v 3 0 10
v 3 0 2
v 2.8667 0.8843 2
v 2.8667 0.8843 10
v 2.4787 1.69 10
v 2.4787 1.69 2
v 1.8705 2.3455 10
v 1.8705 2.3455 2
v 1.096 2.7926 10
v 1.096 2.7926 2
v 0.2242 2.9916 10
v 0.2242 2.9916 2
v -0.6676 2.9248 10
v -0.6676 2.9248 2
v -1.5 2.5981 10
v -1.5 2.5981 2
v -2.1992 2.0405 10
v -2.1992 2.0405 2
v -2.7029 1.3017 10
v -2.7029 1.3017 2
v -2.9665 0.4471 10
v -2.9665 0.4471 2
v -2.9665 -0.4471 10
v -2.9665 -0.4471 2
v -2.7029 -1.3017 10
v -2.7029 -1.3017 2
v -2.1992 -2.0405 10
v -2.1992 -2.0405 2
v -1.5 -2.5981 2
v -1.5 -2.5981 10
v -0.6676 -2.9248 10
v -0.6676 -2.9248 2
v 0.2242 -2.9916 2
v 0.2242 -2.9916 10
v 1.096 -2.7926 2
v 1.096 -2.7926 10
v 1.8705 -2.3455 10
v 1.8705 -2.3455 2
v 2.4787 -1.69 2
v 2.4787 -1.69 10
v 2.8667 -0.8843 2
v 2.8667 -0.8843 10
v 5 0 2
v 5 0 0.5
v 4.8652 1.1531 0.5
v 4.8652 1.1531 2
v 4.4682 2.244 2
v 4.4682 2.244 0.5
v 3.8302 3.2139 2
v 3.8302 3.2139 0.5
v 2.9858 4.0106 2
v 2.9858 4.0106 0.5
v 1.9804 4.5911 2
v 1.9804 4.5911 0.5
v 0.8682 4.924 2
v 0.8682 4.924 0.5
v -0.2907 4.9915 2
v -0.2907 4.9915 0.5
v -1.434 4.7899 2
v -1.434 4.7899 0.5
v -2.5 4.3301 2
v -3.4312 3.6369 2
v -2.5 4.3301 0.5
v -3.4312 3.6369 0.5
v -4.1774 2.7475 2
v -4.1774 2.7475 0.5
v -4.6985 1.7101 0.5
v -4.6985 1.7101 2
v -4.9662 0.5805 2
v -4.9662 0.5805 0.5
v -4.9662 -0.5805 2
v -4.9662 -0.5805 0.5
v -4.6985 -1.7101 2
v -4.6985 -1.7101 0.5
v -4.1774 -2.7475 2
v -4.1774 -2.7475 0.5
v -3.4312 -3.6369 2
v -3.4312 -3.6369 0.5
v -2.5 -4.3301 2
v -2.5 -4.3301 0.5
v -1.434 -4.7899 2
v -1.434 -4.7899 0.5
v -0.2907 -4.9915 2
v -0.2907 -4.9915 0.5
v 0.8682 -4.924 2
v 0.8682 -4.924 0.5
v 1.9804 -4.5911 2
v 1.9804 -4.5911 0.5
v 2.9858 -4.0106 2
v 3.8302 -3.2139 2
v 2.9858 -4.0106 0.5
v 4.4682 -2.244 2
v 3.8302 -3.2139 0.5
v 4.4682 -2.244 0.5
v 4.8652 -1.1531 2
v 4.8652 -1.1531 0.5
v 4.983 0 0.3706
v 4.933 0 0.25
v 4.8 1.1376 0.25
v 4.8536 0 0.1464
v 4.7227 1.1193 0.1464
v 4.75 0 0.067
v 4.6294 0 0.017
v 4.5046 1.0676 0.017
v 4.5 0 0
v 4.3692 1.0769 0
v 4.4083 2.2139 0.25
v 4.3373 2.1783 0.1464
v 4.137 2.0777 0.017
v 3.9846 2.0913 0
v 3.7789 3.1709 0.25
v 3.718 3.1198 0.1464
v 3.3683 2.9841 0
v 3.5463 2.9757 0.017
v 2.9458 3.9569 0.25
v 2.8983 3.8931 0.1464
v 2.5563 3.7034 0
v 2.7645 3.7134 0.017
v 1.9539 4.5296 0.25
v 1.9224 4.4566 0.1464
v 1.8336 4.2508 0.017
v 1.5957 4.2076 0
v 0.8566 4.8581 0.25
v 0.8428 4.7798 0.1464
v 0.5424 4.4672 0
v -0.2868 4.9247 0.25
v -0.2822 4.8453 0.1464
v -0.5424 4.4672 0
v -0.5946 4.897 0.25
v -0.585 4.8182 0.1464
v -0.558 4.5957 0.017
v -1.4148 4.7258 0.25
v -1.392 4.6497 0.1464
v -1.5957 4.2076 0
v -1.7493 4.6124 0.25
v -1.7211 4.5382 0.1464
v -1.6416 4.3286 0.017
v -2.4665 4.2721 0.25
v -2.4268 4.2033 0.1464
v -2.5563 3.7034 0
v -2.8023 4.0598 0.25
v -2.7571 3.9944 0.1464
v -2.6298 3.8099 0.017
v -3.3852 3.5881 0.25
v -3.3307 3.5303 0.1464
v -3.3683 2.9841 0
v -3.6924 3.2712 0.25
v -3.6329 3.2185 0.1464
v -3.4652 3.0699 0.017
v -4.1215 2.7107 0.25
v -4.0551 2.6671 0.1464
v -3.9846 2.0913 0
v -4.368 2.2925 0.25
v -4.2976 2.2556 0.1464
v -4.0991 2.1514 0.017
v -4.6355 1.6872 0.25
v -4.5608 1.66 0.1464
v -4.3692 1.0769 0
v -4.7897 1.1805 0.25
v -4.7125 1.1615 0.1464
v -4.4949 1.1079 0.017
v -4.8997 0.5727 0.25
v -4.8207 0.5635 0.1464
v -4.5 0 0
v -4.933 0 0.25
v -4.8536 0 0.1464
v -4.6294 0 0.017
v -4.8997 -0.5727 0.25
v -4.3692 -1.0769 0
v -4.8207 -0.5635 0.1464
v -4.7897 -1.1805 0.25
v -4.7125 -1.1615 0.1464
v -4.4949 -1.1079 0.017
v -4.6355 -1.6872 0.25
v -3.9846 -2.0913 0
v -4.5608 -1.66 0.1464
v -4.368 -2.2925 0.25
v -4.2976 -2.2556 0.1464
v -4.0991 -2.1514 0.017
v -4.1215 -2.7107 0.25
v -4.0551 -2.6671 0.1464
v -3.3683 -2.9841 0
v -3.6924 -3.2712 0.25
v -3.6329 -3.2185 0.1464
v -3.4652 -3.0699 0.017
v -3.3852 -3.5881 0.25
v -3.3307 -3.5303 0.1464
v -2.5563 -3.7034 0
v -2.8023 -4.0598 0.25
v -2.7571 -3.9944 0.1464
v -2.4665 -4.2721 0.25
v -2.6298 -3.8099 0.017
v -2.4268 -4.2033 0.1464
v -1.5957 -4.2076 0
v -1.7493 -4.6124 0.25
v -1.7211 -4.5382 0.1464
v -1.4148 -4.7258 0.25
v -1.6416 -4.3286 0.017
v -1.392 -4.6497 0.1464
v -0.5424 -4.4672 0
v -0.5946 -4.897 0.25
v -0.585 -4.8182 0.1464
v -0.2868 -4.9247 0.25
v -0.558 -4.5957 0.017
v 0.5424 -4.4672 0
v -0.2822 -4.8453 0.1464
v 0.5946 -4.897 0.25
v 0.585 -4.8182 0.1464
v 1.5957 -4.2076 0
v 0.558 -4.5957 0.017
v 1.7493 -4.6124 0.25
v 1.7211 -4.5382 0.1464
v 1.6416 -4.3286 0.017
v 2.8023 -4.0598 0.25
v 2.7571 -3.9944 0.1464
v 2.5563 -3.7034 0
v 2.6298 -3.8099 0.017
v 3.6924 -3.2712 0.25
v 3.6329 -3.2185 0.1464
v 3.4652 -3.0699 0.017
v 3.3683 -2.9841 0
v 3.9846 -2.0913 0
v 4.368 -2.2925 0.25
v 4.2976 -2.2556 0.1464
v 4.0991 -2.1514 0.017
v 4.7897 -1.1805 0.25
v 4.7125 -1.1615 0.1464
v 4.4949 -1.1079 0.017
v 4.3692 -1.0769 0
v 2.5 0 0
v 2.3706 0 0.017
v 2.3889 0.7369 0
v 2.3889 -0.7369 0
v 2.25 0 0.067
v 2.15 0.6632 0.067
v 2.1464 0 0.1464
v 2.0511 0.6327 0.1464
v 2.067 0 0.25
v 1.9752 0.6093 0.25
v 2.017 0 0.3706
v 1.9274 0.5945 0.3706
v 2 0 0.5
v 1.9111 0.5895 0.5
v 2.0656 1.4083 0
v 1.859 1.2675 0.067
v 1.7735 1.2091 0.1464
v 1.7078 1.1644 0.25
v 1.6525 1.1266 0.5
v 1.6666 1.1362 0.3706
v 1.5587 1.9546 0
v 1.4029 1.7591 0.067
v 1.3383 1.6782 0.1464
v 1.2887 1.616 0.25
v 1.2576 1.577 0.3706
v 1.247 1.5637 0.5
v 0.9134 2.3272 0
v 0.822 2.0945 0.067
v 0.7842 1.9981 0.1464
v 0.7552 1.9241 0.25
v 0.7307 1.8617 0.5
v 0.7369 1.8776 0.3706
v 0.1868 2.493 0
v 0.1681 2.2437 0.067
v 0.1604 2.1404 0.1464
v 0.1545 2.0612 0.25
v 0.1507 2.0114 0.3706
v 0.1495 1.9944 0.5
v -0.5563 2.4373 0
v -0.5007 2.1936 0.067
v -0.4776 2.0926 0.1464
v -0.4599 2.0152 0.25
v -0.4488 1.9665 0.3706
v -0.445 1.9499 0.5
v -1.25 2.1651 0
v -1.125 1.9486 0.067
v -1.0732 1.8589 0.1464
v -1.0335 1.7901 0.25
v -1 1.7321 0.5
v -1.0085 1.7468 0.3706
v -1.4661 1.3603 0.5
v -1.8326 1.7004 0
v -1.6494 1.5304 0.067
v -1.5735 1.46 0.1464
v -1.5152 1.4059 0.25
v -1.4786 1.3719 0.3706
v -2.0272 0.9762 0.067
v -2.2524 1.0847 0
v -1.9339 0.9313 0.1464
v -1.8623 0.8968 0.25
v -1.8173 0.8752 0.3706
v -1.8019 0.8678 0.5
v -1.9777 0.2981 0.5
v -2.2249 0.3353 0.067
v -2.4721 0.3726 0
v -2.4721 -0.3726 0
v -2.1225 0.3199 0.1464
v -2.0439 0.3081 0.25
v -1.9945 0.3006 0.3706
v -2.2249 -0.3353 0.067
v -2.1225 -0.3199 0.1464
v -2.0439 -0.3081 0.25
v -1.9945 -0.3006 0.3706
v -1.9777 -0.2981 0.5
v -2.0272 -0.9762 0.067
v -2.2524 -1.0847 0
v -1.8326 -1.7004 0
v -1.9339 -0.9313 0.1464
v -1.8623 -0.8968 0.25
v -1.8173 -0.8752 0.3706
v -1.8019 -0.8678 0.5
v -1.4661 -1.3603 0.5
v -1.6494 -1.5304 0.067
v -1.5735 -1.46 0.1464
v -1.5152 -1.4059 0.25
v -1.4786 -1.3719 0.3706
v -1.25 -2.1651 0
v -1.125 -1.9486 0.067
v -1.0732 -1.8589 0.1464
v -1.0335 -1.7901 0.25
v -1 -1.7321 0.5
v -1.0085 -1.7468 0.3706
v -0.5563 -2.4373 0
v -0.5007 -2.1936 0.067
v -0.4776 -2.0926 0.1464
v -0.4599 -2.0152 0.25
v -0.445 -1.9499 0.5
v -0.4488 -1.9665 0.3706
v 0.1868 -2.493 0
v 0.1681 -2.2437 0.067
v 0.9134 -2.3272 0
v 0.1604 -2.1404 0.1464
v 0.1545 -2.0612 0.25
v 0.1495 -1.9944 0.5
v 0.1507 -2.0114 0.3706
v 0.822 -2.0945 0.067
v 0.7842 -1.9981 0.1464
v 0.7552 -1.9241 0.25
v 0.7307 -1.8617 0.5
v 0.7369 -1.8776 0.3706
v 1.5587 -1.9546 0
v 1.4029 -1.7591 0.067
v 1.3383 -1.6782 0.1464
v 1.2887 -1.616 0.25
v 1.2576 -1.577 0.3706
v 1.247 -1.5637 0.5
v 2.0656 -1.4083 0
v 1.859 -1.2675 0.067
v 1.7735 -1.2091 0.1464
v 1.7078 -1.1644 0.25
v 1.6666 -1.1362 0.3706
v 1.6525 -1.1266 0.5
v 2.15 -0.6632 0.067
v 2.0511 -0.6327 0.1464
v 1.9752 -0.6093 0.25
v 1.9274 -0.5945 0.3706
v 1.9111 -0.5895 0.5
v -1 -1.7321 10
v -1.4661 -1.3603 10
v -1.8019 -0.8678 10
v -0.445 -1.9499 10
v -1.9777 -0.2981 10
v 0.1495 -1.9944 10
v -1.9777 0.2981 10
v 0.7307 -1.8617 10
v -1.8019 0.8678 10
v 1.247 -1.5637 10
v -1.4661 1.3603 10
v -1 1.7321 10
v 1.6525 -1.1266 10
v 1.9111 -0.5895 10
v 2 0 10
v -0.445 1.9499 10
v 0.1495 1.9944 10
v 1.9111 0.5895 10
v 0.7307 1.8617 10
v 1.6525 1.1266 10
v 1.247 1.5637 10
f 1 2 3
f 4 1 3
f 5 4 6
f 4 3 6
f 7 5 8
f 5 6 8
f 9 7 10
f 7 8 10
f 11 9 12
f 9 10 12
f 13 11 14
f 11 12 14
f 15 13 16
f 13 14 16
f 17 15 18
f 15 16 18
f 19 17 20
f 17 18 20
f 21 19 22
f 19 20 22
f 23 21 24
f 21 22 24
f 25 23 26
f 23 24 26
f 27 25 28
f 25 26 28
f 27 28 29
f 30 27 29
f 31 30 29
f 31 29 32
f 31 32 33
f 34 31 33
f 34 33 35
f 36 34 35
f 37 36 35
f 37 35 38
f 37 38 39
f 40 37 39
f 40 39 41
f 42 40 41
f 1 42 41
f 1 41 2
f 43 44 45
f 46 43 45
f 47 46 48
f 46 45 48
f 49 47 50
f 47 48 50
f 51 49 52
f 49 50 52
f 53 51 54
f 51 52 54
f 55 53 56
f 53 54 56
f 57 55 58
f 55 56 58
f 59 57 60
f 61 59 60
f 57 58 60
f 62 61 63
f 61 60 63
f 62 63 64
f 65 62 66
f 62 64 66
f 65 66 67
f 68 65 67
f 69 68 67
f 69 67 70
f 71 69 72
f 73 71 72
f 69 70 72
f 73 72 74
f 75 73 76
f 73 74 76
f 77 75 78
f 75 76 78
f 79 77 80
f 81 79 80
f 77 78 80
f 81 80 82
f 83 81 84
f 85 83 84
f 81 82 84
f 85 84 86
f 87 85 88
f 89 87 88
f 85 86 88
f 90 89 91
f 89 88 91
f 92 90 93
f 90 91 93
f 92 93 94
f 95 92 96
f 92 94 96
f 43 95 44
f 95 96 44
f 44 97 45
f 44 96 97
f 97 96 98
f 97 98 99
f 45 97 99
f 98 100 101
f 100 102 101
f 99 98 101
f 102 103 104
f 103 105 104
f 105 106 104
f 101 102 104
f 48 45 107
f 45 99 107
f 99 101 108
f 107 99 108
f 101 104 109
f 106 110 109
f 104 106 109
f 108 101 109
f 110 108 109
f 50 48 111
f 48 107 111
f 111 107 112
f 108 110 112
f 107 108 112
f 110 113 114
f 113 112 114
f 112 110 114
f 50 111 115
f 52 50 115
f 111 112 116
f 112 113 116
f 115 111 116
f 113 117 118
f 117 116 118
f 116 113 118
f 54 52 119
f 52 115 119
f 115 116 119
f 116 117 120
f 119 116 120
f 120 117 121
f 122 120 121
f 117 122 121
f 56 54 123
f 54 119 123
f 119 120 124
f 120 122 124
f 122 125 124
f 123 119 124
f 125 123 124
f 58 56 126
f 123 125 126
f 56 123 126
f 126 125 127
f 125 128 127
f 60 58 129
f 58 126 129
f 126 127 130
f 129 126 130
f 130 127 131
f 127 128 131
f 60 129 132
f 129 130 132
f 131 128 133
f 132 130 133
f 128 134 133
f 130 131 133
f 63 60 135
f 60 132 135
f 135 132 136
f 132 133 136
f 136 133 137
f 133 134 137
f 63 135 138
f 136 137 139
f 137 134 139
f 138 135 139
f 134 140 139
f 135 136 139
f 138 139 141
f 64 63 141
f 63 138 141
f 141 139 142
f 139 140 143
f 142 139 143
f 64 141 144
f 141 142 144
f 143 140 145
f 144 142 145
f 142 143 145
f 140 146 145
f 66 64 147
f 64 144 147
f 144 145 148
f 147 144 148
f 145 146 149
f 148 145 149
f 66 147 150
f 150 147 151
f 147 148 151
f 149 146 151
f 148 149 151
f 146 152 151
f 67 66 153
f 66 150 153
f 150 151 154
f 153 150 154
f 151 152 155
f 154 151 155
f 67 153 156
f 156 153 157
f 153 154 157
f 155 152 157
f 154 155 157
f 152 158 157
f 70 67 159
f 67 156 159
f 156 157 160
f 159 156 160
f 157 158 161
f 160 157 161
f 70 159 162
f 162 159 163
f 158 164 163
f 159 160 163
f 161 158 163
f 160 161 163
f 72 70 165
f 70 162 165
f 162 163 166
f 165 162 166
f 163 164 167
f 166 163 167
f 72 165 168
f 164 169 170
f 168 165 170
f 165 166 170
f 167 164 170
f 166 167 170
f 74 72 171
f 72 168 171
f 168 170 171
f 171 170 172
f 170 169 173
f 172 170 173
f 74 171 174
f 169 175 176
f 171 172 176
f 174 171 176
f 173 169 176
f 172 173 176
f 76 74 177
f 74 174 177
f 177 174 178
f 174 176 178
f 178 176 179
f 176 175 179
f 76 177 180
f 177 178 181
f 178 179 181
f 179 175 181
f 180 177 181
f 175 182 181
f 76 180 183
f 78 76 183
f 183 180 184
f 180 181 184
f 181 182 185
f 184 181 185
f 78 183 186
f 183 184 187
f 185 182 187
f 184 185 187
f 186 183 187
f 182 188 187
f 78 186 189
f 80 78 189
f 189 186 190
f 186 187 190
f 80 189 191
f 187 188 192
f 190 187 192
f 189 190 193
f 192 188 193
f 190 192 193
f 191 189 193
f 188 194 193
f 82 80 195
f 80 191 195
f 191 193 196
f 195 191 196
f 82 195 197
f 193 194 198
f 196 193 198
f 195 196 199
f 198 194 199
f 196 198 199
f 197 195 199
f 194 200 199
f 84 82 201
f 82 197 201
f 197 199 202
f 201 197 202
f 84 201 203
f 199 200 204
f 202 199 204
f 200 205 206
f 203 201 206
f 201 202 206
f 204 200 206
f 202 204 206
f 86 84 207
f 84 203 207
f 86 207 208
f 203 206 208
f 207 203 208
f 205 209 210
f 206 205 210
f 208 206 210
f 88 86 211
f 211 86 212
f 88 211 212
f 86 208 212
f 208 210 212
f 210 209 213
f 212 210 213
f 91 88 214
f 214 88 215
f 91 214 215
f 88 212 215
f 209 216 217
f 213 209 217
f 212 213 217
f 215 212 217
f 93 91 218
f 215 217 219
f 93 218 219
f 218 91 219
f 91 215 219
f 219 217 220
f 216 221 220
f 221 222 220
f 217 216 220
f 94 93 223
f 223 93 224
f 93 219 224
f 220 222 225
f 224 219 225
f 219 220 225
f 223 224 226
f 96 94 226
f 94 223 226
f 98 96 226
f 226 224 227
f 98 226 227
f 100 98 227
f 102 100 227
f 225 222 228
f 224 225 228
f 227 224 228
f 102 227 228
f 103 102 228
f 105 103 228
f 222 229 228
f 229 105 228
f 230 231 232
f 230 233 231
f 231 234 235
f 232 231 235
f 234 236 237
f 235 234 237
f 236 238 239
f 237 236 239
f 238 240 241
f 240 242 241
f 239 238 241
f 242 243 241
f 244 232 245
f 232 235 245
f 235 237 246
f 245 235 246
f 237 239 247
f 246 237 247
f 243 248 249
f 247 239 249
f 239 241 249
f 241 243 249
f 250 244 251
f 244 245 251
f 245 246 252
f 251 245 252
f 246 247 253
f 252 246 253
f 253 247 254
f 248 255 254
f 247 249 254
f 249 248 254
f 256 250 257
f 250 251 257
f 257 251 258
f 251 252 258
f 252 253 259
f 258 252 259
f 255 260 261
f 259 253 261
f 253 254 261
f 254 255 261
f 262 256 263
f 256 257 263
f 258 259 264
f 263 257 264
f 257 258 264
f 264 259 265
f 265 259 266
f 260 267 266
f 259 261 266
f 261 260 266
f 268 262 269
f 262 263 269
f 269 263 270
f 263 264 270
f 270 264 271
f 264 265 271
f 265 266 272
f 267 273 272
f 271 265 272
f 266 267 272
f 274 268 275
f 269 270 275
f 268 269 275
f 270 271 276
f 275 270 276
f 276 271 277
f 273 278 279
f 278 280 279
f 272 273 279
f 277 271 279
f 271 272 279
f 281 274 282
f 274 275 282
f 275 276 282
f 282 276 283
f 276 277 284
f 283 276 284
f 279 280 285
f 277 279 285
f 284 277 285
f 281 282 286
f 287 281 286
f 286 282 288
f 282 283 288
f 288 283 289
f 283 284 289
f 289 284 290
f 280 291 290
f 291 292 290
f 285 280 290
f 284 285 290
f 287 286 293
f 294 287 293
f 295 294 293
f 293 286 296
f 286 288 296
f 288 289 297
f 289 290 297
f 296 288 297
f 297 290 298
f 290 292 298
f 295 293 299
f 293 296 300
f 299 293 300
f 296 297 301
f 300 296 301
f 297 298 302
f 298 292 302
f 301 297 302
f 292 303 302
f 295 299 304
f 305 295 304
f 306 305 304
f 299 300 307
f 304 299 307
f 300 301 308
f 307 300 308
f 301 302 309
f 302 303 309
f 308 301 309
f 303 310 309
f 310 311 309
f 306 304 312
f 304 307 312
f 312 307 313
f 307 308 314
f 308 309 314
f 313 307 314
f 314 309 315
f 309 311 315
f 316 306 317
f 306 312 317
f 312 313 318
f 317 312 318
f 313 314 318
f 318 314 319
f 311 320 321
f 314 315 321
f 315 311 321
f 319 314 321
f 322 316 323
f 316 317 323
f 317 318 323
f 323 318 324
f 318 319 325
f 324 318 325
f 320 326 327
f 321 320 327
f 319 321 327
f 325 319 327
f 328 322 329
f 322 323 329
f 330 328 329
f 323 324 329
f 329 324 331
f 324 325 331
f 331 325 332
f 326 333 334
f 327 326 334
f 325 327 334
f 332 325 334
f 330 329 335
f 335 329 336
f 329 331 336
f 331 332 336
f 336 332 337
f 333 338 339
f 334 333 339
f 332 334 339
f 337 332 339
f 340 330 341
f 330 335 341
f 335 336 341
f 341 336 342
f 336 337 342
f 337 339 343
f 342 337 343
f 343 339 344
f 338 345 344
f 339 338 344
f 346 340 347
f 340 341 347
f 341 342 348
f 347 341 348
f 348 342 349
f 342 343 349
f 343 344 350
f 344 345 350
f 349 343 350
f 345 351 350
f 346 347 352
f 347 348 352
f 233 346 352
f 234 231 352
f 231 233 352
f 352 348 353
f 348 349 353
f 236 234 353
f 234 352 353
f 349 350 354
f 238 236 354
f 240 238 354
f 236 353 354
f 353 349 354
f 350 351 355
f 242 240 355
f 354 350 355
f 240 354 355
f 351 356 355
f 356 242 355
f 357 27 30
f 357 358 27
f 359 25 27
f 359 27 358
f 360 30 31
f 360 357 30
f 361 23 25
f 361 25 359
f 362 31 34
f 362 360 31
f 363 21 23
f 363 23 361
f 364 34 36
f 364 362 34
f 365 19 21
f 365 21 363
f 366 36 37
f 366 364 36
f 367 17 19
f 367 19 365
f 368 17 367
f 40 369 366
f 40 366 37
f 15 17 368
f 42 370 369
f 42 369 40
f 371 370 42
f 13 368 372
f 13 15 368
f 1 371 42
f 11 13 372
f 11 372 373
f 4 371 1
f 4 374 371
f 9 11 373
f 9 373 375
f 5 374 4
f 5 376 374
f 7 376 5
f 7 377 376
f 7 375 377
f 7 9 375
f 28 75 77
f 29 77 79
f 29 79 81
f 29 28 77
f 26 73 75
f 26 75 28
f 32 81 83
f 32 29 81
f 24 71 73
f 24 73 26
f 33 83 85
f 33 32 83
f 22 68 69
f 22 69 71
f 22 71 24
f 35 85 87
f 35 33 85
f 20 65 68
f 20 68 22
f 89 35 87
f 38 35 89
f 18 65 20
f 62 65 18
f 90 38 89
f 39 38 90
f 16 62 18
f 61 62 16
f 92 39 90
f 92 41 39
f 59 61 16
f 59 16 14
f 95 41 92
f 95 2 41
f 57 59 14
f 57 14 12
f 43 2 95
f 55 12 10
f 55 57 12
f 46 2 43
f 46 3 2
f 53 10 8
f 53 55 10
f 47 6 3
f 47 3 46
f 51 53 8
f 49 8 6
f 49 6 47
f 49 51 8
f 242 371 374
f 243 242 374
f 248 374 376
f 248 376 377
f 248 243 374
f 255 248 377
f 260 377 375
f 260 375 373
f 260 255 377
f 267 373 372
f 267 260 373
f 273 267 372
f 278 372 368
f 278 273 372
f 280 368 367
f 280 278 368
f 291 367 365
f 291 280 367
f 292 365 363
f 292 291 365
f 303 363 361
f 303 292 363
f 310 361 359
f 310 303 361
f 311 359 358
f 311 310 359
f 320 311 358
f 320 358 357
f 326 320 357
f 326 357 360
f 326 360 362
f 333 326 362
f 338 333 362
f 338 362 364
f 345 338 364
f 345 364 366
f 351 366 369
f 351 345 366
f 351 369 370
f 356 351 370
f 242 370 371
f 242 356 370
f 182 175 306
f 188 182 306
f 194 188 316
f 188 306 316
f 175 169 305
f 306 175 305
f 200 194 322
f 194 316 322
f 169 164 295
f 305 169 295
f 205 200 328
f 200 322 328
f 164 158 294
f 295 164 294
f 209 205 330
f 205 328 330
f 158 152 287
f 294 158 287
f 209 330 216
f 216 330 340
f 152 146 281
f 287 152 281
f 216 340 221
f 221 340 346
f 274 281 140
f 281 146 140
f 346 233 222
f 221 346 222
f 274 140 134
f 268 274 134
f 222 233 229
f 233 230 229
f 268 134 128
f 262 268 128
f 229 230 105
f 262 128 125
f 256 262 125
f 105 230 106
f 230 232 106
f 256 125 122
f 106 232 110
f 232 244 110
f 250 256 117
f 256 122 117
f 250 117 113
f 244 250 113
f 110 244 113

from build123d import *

# Parameters (mm, degrees)
F0_R     = 3
F0_R_2   = 2
F1_DEPTH = 10
F0_R_3   = 5
F2_DEPTH = 2
F3_R     = 0.5


with BuildPart() as f1:
    # F0 (on Top) → F1 (new body)
    with BuildSketch(Plane.XY):
        Circle(F0_R)
        Circle(F0_R_2, mode=Mode.SUBTRACT)
    extrude(amount=F1_DEPTH)

    # F0 (on Top) → F2 (join)
    with BuildSketch(Plane.XY):
        Circle(F0_R_3)
        Circle(F0_R, mode=Mode.SUBTRACT)
    extrude(amount=F2_DEPTH)

    # F3
    f3_edges = [f1.edges().sort_by_distance(p)[0] for p in [
        (-5, 0, 0),
        (-2, 0, 0),
    ]]
    fillet(f3_edges, radius=F3_R)


solid = f1.part
